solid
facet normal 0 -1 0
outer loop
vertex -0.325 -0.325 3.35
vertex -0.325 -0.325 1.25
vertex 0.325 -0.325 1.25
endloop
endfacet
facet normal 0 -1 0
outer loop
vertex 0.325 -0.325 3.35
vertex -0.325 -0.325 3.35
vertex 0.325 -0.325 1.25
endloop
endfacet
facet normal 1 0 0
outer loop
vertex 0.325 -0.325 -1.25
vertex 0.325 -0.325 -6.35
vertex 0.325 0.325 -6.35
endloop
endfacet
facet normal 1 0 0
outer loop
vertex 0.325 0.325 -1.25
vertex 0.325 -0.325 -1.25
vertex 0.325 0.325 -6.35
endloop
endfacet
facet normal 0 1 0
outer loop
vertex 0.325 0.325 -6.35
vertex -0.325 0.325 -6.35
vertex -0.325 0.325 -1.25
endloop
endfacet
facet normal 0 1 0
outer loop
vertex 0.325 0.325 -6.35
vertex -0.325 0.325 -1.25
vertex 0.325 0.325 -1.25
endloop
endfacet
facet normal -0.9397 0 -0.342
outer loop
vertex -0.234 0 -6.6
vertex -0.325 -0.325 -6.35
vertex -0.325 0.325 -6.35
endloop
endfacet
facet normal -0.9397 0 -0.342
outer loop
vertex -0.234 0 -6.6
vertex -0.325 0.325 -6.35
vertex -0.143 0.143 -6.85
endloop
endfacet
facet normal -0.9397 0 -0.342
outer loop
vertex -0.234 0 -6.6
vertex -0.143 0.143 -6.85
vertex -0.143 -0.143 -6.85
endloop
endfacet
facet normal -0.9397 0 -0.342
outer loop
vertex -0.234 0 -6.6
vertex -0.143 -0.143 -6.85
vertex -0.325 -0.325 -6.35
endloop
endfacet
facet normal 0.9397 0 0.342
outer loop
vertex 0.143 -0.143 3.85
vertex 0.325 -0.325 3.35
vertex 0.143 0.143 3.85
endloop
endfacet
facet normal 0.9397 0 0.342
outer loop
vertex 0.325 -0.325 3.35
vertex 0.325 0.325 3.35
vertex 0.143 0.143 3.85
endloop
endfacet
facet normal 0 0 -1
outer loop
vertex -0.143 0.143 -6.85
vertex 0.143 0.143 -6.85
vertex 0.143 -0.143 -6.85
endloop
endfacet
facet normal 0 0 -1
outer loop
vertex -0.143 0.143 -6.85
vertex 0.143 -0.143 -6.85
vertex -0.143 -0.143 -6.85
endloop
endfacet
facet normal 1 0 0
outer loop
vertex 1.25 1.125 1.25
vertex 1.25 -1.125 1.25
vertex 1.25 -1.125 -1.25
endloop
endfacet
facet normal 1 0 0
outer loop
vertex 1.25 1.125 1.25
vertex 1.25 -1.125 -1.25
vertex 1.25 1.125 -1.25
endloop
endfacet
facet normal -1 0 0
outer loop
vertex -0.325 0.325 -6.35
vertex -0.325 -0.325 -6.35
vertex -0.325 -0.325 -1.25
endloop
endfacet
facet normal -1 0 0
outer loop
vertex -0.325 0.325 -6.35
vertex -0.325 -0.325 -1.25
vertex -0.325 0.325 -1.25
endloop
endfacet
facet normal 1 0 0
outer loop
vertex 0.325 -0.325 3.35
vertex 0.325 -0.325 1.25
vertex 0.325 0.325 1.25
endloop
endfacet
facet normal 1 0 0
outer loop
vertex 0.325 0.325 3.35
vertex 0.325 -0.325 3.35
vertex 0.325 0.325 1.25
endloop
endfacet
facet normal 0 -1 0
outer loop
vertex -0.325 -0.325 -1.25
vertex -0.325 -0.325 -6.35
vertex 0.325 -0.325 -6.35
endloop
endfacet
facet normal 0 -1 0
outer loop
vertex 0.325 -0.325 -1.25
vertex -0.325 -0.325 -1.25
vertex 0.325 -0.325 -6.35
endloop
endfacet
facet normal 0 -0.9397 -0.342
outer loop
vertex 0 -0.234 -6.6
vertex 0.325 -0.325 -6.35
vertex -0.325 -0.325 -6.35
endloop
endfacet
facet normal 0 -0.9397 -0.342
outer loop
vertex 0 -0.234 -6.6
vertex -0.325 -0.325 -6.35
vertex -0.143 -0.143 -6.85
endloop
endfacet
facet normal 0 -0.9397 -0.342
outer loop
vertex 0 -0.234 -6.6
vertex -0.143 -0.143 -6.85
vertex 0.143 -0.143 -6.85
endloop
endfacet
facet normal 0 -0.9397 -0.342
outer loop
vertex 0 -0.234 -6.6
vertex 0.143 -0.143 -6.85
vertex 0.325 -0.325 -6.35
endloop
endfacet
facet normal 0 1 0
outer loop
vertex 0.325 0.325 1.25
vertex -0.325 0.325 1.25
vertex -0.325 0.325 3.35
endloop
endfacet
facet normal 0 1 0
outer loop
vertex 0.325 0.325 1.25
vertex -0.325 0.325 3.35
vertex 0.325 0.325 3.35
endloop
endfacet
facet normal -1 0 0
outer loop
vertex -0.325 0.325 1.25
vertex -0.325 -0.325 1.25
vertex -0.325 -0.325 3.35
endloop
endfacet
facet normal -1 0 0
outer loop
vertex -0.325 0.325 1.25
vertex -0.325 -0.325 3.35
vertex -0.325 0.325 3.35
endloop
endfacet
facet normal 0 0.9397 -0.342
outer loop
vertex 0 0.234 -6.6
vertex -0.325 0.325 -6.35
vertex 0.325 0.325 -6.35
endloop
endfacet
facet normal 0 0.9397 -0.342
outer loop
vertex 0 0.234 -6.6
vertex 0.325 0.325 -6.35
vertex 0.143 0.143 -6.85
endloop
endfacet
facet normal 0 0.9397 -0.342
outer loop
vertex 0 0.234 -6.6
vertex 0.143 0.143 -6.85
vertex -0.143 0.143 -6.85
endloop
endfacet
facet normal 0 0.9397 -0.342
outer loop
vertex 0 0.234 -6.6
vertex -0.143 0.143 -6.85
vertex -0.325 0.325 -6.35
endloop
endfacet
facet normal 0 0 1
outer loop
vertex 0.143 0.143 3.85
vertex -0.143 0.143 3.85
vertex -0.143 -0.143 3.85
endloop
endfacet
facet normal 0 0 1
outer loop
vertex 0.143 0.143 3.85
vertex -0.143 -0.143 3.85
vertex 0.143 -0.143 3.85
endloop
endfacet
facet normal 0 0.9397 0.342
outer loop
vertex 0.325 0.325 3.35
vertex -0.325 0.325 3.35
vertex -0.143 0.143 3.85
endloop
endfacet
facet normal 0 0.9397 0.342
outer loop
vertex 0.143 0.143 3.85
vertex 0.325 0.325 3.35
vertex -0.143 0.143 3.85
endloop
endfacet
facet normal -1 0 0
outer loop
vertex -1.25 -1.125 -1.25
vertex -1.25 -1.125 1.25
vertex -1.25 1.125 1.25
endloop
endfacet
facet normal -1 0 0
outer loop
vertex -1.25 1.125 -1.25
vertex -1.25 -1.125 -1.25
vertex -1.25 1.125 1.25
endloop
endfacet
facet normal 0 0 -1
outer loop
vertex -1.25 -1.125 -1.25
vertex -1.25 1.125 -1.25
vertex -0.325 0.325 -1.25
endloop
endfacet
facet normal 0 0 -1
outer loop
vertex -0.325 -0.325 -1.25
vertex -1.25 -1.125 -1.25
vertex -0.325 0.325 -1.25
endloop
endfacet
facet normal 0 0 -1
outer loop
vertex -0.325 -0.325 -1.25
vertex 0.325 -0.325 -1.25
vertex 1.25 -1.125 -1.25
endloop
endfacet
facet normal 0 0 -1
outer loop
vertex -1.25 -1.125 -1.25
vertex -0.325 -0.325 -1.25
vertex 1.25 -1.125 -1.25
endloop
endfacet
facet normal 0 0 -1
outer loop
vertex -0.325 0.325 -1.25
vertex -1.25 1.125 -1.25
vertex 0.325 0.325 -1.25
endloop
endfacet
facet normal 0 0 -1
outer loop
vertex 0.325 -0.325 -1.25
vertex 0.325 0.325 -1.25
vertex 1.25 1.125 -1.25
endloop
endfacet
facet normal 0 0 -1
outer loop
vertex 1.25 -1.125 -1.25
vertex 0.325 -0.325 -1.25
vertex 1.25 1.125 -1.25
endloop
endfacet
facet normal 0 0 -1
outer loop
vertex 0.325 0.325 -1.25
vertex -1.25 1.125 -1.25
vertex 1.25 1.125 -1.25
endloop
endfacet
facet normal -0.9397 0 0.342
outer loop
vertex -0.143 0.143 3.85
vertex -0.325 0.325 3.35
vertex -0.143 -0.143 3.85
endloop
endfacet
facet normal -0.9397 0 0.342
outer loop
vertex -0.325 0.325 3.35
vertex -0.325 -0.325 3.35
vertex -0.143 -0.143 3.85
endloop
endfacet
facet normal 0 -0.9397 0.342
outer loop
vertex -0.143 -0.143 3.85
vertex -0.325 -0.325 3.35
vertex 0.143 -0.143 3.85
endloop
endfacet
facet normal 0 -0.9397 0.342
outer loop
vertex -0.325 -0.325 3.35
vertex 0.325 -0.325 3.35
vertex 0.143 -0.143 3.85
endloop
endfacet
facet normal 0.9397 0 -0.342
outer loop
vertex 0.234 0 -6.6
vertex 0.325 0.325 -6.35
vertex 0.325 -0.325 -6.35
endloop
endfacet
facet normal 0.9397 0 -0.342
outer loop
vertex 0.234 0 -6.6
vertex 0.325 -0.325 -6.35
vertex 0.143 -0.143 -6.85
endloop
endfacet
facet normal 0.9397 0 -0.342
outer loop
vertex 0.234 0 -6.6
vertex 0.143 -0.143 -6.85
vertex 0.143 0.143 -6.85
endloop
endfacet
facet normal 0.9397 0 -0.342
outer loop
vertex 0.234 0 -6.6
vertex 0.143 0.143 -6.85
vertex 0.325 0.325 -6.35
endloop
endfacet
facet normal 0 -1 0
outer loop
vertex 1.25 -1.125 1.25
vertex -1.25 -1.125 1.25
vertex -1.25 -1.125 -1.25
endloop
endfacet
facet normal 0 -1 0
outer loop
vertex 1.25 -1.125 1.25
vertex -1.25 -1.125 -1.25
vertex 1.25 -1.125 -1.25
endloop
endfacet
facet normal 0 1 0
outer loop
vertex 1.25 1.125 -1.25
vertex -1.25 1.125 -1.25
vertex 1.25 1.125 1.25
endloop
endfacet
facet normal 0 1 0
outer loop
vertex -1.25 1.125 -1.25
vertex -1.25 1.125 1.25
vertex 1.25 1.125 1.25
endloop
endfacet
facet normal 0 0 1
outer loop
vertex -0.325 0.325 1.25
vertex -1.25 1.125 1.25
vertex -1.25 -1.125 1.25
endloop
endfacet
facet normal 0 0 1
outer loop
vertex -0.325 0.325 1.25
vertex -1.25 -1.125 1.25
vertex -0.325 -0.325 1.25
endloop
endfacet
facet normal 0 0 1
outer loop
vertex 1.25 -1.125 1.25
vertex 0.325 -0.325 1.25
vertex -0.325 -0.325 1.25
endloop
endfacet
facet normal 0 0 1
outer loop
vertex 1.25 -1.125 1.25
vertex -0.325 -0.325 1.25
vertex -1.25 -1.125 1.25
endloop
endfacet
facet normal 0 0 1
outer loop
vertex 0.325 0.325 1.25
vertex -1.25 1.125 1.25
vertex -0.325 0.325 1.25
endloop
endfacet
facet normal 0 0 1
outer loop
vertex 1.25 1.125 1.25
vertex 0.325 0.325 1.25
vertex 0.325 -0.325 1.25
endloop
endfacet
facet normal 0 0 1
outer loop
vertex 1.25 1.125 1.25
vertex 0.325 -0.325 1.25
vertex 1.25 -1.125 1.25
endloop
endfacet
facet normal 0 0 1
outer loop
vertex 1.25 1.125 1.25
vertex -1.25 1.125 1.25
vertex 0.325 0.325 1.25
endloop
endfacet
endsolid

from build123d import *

# Parameters (mm, degrees)
SKETCH1_W                = 2.5
SKETCH1_H                = 2.25
BOSS_EXTRUDE1_DEPTH      = 1.25
BOSS_EXTRUDE2_DEPTH      = 3.35
BOSS_EXTRUDE2_DEPTH_BACK = 6.35
SKETCH2_W                = 0.65
SKETCH2_H                = 0.65
SKETCH3_W                = 0.65
SKETCH3_H                = 0.65
BOSS_EXTRUDE3_DEPTH      = 0.5
BOSS_EXTRUDE3_TAPER      = 20
SKETCH7_W                = 0.65
SKETCH7_H                = 0.65
BOSS_EXTRUDE6_DEPTH      = 0.5
BOSS_EXTRUDE6_TAPER      = 20


with BuildPart() as part:
    # Sketch1 → Boss-Extrude1 (new, symmetric)
    with BuildSketch(Plane.XY):
        Rectangle(SKETCH1_W, SKETCH1_H)
    extrude(amount=BOSS_EXTRUDE1_DEPTH, both=True)

    # Sketch2 → Boss-Extrude2 (add, two sides: drawn at the far end of the back side and taken through both)
    with BuildSketch(Plane.XY.offset(-BOSS_EXTRUDE2_DEPTH_BACK)):
        Rectangle(SKETCH2_W, SKETCH2_H)
    extrude(amount=BOSS_EXTRUDE2_DEPTH + BOSS_EXTRUDE2_DEPTH_BACK)

    # Sketch3 → Boss-Extrude3 (add)
    with BuildSketch(Plane(origin=(0, 0, -6.35), x_dir=(-1, 0, 0), z_dir=(0, 0, -1))):
        Rectangle(SKETCH3_W, SKETCH3_H)
    extrude(amount=BOSS_EXTRUDE3_DEPTH, taper=BOSS_EXTRUDE3_TAPER)

    # Sketch7 → Boss-Extrude6 (add)
    with BuildSketch(Plane.XY.offset(3.35)):
        Rectangle(SKETCH7_W, SKETCH7_H)
    extrude(amount=BOSS_EXTRUDE6_DEPTH, taper=BOSS_EXTRUDE6_TAPER)


solid = part.part
